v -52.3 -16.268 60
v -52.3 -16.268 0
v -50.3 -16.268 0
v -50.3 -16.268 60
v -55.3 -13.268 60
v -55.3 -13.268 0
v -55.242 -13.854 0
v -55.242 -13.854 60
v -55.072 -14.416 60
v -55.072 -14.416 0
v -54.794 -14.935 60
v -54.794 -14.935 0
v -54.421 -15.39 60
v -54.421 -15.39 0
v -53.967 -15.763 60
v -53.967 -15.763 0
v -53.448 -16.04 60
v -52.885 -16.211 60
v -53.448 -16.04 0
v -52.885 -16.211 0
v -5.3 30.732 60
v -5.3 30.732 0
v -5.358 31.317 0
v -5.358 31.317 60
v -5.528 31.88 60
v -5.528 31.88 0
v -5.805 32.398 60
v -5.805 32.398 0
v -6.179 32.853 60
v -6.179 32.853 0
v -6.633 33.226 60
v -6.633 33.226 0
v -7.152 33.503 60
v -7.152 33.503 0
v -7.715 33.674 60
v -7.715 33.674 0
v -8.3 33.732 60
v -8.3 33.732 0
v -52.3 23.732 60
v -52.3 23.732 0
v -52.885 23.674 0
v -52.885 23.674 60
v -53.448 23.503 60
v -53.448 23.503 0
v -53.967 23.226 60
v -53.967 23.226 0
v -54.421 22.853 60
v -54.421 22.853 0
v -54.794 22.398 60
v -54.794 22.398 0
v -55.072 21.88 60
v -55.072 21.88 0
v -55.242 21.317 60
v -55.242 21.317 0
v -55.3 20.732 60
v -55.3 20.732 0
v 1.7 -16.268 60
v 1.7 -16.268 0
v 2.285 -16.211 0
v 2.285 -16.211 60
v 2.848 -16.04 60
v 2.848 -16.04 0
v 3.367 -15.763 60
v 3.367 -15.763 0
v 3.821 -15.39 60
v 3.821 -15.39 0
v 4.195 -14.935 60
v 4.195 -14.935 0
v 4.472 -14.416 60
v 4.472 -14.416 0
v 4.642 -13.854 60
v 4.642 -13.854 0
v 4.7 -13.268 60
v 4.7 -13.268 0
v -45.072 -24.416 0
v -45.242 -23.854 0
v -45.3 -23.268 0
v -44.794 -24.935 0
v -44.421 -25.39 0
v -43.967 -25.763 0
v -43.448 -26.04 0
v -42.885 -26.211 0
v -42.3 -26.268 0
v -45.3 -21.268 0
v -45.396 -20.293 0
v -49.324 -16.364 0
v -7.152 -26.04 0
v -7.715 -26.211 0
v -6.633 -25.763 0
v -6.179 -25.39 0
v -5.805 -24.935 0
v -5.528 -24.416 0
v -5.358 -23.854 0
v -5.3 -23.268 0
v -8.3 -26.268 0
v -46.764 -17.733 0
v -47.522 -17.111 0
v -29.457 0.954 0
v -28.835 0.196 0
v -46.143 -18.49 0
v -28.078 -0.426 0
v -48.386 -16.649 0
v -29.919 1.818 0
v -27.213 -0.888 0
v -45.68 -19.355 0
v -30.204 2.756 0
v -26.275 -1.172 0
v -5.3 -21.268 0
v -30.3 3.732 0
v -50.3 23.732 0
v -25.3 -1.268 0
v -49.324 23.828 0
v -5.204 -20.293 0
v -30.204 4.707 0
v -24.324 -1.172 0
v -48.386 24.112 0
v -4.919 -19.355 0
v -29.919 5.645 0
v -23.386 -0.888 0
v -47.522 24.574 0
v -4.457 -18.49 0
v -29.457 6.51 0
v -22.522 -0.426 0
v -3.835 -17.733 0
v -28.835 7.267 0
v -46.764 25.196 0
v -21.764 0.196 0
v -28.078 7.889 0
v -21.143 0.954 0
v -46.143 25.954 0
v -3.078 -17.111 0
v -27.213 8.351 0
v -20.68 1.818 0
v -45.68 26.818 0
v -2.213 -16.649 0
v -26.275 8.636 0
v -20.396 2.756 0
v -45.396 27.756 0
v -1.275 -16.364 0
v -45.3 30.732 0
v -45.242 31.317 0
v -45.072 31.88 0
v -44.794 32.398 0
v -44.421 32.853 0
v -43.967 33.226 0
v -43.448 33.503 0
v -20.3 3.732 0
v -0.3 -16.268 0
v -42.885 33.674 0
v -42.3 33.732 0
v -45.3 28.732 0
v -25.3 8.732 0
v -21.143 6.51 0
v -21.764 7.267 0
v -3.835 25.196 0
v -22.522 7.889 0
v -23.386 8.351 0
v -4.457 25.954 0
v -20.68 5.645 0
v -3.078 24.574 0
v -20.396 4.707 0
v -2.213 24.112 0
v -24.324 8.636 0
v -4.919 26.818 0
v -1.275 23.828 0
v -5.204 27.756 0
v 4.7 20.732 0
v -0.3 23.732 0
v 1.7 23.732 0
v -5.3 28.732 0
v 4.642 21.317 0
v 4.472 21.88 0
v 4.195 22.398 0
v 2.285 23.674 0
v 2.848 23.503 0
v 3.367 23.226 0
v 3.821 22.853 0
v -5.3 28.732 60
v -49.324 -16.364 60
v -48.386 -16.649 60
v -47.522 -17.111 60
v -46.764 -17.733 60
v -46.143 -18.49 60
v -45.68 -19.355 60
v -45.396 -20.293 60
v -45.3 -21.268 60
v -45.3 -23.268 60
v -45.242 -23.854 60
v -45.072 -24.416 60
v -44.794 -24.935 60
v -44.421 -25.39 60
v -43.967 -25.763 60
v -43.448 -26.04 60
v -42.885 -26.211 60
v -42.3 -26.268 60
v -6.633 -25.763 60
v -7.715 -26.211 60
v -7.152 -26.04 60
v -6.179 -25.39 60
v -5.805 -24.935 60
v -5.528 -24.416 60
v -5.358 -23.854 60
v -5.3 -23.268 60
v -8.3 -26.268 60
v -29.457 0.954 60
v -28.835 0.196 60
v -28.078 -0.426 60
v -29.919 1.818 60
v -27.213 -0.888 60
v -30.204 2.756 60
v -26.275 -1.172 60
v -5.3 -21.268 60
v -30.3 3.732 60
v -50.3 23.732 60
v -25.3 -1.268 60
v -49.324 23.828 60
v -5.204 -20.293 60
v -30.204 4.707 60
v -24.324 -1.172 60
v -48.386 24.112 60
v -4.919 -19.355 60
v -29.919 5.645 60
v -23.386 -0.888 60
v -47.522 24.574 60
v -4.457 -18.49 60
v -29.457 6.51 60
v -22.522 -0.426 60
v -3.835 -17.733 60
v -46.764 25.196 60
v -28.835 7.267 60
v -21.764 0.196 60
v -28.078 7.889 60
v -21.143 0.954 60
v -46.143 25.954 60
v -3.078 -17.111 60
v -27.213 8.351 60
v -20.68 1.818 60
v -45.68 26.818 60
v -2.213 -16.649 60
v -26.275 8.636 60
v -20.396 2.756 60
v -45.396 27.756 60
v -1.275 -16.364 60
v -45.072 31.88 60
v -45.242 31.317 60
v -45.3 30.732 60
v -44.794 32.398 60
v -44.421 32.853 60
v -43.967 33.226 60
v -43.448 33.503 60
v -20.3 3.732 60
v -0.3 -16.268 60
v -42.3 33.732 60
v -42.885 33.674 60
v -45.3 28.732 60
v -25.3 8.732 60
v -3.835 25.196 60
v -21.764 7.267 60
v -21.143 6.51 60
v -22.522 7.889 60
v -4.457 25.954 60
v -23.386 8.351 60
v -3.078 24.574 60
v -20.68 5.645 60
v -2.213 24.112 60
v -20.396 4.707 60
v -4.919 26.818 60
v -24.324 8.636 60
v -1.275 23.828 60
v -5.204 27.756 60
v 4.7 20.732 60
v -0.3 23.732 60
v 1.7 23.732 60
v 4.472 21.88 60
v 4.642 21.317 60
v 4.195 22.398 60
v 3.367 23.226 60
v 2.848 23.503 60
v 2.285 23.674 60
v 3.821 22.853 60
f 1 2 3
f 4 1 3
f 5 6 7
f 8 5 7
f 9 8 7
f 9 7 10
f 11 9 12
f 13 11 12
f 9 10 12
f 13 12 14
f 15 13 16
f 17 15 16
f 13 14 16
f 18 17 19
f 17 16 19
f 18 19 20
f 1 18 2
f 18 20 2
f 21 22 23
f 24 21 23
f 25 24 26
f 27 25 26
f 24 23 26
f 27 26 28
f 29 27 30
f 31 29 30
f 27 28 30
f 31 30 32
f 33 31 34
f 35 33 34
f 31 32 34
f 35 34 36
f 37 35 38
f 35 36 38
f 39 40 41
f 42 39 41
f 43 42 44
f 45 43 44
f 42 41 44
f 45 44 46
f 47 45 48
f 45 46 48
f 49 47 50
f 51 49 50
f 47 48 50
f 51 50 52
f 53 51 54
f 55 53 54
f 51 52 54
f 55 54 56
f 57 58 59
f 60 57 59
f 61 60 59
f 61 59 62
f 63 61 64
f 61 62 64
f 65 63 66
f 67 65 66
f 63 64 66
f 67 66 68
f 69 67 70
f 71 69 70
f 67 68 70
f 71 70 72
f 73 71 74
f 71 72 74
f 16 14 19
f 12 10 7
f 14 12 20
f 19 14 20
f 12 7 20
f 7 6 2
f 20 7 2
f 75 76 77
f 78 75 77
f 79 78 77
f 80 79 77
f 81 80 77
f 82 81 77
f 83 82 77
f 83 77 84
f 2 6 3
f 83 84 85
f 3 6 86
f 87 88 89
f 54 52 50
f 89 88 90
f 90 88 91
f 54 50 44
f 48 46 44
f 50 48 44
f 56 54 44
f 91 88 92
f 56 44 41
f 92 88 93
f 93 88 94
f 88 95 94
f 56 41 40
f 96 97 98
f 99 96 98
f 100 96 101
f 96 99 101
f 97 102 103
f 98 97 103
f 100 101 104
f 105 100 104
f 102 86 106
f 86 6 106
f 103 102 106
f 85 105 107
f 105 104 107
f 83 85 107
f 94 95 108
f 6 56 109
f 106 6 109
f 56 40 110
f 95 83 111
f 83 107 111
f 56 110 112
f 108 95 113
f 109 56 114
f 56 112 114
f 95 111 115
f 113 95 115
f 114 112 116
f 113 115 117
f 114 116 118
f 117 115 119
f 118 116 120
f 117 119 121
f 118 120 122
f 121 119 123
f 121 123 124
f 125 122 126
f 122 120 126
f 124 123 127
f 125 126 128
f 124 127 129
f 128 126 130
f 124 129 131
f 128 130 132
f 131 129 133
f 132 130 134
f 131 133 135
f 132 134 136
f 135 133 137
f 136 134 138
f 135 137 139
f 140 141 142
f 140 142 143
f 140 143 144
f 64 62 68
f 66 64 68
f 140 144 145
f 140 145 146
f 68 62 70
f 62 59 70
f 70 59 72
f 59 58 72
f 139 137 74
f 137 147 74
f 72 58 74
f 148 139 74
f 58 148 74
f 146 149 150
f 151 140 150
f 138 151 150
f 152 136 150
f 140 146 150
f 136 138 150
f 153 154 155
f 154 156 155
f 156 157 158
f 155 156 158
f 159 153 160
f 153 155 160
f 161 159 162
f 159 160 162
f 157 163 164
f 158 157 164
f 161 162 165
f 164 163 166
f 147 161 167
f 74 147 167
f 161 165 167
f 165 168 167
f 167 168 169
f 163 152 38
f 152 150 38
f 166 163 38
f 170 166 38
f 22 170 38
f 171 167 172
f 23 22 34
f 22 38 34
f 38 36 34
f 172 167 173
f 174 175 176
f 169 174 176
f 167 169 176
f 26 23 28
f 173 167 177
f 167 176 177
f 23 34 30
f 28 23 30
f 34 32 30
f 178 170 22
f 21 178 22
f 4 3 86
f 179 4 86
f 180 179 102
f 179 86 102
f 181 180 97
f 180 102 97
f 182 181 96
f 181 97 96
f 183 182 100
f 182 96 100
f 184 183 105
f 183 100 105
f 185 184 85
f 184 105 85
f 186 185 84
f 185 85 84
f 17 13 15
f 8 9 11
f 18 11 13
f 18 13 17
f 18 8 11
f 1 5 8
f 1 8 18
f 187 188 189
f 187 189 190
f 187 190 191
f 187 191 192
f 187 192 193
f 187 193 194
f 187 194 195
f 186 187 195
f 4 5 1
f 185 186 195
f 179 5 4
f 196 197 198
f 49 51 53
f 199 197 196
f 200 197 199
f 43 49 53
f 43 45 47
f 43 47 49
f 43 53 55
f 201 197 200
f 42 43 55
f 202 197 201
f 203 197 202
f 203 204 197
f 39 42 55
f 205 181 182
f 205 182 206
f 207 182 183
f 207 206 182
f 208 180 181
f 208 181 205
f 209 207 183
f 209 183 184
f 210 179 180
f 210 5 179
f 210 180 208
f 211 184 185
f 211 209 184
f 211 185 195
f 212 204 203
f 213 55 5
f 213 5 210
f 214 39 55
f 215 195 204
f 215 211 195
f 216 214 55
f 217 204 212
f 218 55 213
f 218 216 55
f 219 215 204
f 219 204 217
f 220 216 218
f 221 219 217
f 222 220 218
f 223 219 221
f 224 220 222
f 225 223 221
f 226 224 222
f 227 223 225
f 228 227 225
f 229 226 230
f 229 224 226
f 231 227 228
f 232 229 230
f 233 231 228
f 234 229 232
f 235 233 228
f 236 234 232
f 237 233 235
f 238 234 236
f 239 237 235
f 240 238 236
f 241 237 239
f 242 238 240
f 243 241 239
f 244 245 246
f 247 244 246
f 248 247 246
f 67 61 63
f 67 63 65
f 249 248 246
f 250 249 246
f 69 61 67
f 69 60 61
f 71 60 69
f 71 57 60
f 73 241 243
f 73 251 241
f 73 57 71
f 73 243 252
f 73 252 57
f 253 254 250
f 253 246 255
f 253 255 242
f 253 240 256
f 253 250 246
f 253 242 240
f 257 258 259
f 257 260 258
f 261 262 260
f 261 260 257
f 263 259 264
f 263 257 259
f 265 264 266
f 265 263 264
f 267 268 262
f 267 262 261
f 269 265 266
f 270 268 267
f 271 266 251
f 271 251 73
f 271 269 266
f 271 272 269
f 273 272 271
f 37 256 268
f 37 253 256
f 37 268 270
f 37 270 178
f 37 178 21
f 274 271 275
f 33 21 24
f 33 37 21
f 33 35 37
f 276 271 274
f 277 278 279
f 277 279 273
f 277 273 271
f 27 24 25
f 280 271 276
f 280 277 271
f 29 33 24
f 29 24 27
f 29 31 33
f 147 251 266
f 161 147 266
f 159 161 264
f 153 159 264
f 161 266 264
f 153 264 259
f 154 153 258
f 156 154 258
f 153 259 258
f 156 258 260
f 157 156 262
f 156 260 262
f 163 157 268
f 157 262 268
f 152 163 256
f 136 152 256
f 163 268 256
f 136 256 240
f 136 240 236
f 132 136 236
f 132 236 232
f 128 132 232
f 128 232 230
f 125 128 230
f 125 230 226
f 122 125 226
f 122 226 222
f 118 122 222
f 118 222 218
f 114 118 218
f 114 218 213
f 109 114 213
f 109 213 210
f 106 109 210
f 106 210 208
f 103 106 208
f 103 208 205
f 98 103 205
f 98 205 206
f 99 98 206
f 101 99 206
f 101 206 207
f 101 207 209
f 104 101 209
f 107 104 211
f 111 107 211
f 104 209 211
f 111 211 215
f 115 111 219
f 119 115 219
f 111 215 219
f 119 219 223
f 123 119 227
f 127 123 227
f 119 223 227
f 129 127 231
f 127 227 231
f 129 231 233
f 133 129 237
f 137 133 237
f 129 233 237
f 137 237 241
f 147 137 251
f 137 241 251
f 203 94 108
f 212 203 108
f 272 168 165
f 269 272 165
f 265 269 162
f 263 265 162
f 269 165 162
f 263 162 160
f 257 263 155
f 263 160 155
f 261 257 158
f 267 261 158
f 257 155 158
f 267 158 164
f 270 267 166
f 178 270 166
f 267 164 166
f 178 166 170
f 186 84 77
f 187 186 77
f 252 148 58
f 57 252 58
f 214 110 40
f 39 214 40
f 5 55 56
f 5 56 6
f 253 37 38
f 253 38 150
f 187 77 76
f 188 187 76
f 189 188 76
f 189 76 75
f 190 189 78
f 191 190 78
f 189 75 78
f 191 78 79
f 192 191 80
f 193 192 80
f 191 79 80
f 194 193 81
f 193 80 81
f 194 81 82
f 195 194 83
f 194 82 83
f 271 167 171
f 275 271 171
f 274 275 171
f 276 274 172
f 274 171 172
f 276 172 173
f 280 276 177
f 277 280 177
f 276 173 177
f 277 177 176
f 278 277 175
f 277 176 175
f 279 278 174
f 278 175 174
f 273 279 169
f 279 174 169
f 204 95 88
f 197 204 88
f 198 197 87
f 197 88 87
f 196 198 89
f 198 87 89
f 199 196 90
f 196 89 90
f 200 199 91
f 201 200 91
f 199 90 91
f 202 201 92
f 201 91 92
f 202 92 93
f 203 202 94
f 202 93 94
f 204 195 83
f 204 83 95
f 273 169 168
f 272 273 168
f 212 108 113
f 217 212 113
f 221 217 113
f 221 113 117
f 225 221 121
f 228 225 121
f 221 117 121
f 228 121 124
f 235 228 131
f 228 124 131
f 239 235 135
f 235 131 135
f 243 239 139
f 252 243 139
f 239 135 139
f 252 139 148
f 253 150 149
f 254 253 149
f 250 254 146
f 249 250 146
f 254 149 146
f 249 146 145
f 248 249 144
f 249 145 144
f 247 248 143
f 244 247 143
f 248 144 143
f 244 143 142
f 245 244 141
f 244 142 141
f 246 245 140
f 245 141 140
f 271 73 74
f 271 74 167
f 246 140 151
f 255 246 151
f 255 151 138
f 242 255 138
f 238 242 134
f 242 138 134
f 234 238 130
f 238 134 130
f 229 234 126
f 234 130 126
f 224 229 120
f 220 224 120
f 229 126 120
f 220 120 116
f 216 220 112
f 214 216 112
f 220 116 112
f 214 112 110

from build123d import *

# Parameters (mm, degrees)
Y_KSEKLIK_EKSTR_ZYON1_DEPTH = 60
IZIM2_R                     = 5
KES_EKSTR_ZYON1_DEPTH       = 61


with BuildPart() as part:
    # Çizim1 → Yükseklik-Ekstrüzyon1 (new body)
    with BuildSketch(Plane.XY):
        with BuildLine():
            Line((-45.299869289, 30.731722377), (-45.299869289, 28.731722377))
            ThreePointArc((-45.299869289, 28.731722377), (-46.764335383, 25.196188471), (-50.299869289, 23.731722377))
            Line((-50.299869289, 23.731722377), (-52.299869289, 23.731722377))
            ThreePointArc((-52.299869289, 23.731722377), (-54.421189632, 22.853042721), (-55.299869289, 20.731722377))
            Line((-55.299869289, 20.731722377), (-55.299869289, -13.268277623))
            ThreePointArc((-55.299869289, -13.268277623), (-54.421189632, -15.389597966), (-52.299869289, -16.268277623))
            Line((-52.299869289, -16.268277623), (-50.299869289, -16.268277623))
            ThreePointArc((-50.299869289, -16.268277623), (-46.764335383, -17.732743717), (-45.299869289, -21.268277623))
            Line((-45.299869289, -21.268277623), (-45.299869289, -23.268277623))
            ThreePointArc((-45.299869289, -23.268277623), (-44.421189632, -25.389597966), (-42.299869289, -26.268277623))
            Line((-42.299869289, -26.268277623), (-8.299869289, -26.268277623))
            ThreePointArc((-8.299869289, -26.268277623), (-6.178548945, -25.389597966), (-5.299869289, -23.268277623))
            Line((-5.299869289, -23.268277623), (-5.299869289, -21.268277623))
            ThreePointArc((-5.299869289, -21.268277623), (-3.835403195, -17.732743717), (-0.299869289, -16.268277623))
            Line((-0.299869289, -16.268277623), (1.700130711, -16.268277623))
            ThreePointArc((1.700130711, -16.268277623), (3.821451055, -15.389597966), (4.700130711, -13.268277623))
            Line((4.700130711, -13.268277623), (4.700130711, 20.731722377))
            ThreePointArc((4.700130711, 20.731722377), (3.821451055, 22.853042721), (1.700130711, 23.731722377))
            Line((1.700130711, 23.731722377), (-0.299869289, 23.731722377))
            ThreePointArc((-0.299869289, 23.731722377), (-3.835403195, 25.196188471), (-5.299869289, 28.731722377))
            Line((-5.299869289, 28.731722377), (-5.299869289, 30.731722377))
            ThreePointArc((-5.299869289, 30.731722377), (-6.178548945, 32.853042721), (-8.299869289, 33.731722377))
            Line((-8.299869289, 33.731722377), (-42.299869289, 33.731722377))
            ThreePointArc((-42.299869289, 33.731722377), (-44.421189632, 32.853042721), (-45.299869289, 30.731722377))
        make_face()
    extrude(amount=Y_KSEKLIK_EKSTR_ZYON1_DEPTH)

    # Çizim2 → Kes-Ekstrüzyon1 (cut, through all)
    with BuildSketch(Plane.XY.offset(60)):
        with Locations((-25.299869289, 3.731722377)):
            Circle(IZIM2_R)
    extrude(amount=-KES_EKSTR_ZYON1_DEPTH, mode=Mode.SUBTRACT)


solid = part.part
